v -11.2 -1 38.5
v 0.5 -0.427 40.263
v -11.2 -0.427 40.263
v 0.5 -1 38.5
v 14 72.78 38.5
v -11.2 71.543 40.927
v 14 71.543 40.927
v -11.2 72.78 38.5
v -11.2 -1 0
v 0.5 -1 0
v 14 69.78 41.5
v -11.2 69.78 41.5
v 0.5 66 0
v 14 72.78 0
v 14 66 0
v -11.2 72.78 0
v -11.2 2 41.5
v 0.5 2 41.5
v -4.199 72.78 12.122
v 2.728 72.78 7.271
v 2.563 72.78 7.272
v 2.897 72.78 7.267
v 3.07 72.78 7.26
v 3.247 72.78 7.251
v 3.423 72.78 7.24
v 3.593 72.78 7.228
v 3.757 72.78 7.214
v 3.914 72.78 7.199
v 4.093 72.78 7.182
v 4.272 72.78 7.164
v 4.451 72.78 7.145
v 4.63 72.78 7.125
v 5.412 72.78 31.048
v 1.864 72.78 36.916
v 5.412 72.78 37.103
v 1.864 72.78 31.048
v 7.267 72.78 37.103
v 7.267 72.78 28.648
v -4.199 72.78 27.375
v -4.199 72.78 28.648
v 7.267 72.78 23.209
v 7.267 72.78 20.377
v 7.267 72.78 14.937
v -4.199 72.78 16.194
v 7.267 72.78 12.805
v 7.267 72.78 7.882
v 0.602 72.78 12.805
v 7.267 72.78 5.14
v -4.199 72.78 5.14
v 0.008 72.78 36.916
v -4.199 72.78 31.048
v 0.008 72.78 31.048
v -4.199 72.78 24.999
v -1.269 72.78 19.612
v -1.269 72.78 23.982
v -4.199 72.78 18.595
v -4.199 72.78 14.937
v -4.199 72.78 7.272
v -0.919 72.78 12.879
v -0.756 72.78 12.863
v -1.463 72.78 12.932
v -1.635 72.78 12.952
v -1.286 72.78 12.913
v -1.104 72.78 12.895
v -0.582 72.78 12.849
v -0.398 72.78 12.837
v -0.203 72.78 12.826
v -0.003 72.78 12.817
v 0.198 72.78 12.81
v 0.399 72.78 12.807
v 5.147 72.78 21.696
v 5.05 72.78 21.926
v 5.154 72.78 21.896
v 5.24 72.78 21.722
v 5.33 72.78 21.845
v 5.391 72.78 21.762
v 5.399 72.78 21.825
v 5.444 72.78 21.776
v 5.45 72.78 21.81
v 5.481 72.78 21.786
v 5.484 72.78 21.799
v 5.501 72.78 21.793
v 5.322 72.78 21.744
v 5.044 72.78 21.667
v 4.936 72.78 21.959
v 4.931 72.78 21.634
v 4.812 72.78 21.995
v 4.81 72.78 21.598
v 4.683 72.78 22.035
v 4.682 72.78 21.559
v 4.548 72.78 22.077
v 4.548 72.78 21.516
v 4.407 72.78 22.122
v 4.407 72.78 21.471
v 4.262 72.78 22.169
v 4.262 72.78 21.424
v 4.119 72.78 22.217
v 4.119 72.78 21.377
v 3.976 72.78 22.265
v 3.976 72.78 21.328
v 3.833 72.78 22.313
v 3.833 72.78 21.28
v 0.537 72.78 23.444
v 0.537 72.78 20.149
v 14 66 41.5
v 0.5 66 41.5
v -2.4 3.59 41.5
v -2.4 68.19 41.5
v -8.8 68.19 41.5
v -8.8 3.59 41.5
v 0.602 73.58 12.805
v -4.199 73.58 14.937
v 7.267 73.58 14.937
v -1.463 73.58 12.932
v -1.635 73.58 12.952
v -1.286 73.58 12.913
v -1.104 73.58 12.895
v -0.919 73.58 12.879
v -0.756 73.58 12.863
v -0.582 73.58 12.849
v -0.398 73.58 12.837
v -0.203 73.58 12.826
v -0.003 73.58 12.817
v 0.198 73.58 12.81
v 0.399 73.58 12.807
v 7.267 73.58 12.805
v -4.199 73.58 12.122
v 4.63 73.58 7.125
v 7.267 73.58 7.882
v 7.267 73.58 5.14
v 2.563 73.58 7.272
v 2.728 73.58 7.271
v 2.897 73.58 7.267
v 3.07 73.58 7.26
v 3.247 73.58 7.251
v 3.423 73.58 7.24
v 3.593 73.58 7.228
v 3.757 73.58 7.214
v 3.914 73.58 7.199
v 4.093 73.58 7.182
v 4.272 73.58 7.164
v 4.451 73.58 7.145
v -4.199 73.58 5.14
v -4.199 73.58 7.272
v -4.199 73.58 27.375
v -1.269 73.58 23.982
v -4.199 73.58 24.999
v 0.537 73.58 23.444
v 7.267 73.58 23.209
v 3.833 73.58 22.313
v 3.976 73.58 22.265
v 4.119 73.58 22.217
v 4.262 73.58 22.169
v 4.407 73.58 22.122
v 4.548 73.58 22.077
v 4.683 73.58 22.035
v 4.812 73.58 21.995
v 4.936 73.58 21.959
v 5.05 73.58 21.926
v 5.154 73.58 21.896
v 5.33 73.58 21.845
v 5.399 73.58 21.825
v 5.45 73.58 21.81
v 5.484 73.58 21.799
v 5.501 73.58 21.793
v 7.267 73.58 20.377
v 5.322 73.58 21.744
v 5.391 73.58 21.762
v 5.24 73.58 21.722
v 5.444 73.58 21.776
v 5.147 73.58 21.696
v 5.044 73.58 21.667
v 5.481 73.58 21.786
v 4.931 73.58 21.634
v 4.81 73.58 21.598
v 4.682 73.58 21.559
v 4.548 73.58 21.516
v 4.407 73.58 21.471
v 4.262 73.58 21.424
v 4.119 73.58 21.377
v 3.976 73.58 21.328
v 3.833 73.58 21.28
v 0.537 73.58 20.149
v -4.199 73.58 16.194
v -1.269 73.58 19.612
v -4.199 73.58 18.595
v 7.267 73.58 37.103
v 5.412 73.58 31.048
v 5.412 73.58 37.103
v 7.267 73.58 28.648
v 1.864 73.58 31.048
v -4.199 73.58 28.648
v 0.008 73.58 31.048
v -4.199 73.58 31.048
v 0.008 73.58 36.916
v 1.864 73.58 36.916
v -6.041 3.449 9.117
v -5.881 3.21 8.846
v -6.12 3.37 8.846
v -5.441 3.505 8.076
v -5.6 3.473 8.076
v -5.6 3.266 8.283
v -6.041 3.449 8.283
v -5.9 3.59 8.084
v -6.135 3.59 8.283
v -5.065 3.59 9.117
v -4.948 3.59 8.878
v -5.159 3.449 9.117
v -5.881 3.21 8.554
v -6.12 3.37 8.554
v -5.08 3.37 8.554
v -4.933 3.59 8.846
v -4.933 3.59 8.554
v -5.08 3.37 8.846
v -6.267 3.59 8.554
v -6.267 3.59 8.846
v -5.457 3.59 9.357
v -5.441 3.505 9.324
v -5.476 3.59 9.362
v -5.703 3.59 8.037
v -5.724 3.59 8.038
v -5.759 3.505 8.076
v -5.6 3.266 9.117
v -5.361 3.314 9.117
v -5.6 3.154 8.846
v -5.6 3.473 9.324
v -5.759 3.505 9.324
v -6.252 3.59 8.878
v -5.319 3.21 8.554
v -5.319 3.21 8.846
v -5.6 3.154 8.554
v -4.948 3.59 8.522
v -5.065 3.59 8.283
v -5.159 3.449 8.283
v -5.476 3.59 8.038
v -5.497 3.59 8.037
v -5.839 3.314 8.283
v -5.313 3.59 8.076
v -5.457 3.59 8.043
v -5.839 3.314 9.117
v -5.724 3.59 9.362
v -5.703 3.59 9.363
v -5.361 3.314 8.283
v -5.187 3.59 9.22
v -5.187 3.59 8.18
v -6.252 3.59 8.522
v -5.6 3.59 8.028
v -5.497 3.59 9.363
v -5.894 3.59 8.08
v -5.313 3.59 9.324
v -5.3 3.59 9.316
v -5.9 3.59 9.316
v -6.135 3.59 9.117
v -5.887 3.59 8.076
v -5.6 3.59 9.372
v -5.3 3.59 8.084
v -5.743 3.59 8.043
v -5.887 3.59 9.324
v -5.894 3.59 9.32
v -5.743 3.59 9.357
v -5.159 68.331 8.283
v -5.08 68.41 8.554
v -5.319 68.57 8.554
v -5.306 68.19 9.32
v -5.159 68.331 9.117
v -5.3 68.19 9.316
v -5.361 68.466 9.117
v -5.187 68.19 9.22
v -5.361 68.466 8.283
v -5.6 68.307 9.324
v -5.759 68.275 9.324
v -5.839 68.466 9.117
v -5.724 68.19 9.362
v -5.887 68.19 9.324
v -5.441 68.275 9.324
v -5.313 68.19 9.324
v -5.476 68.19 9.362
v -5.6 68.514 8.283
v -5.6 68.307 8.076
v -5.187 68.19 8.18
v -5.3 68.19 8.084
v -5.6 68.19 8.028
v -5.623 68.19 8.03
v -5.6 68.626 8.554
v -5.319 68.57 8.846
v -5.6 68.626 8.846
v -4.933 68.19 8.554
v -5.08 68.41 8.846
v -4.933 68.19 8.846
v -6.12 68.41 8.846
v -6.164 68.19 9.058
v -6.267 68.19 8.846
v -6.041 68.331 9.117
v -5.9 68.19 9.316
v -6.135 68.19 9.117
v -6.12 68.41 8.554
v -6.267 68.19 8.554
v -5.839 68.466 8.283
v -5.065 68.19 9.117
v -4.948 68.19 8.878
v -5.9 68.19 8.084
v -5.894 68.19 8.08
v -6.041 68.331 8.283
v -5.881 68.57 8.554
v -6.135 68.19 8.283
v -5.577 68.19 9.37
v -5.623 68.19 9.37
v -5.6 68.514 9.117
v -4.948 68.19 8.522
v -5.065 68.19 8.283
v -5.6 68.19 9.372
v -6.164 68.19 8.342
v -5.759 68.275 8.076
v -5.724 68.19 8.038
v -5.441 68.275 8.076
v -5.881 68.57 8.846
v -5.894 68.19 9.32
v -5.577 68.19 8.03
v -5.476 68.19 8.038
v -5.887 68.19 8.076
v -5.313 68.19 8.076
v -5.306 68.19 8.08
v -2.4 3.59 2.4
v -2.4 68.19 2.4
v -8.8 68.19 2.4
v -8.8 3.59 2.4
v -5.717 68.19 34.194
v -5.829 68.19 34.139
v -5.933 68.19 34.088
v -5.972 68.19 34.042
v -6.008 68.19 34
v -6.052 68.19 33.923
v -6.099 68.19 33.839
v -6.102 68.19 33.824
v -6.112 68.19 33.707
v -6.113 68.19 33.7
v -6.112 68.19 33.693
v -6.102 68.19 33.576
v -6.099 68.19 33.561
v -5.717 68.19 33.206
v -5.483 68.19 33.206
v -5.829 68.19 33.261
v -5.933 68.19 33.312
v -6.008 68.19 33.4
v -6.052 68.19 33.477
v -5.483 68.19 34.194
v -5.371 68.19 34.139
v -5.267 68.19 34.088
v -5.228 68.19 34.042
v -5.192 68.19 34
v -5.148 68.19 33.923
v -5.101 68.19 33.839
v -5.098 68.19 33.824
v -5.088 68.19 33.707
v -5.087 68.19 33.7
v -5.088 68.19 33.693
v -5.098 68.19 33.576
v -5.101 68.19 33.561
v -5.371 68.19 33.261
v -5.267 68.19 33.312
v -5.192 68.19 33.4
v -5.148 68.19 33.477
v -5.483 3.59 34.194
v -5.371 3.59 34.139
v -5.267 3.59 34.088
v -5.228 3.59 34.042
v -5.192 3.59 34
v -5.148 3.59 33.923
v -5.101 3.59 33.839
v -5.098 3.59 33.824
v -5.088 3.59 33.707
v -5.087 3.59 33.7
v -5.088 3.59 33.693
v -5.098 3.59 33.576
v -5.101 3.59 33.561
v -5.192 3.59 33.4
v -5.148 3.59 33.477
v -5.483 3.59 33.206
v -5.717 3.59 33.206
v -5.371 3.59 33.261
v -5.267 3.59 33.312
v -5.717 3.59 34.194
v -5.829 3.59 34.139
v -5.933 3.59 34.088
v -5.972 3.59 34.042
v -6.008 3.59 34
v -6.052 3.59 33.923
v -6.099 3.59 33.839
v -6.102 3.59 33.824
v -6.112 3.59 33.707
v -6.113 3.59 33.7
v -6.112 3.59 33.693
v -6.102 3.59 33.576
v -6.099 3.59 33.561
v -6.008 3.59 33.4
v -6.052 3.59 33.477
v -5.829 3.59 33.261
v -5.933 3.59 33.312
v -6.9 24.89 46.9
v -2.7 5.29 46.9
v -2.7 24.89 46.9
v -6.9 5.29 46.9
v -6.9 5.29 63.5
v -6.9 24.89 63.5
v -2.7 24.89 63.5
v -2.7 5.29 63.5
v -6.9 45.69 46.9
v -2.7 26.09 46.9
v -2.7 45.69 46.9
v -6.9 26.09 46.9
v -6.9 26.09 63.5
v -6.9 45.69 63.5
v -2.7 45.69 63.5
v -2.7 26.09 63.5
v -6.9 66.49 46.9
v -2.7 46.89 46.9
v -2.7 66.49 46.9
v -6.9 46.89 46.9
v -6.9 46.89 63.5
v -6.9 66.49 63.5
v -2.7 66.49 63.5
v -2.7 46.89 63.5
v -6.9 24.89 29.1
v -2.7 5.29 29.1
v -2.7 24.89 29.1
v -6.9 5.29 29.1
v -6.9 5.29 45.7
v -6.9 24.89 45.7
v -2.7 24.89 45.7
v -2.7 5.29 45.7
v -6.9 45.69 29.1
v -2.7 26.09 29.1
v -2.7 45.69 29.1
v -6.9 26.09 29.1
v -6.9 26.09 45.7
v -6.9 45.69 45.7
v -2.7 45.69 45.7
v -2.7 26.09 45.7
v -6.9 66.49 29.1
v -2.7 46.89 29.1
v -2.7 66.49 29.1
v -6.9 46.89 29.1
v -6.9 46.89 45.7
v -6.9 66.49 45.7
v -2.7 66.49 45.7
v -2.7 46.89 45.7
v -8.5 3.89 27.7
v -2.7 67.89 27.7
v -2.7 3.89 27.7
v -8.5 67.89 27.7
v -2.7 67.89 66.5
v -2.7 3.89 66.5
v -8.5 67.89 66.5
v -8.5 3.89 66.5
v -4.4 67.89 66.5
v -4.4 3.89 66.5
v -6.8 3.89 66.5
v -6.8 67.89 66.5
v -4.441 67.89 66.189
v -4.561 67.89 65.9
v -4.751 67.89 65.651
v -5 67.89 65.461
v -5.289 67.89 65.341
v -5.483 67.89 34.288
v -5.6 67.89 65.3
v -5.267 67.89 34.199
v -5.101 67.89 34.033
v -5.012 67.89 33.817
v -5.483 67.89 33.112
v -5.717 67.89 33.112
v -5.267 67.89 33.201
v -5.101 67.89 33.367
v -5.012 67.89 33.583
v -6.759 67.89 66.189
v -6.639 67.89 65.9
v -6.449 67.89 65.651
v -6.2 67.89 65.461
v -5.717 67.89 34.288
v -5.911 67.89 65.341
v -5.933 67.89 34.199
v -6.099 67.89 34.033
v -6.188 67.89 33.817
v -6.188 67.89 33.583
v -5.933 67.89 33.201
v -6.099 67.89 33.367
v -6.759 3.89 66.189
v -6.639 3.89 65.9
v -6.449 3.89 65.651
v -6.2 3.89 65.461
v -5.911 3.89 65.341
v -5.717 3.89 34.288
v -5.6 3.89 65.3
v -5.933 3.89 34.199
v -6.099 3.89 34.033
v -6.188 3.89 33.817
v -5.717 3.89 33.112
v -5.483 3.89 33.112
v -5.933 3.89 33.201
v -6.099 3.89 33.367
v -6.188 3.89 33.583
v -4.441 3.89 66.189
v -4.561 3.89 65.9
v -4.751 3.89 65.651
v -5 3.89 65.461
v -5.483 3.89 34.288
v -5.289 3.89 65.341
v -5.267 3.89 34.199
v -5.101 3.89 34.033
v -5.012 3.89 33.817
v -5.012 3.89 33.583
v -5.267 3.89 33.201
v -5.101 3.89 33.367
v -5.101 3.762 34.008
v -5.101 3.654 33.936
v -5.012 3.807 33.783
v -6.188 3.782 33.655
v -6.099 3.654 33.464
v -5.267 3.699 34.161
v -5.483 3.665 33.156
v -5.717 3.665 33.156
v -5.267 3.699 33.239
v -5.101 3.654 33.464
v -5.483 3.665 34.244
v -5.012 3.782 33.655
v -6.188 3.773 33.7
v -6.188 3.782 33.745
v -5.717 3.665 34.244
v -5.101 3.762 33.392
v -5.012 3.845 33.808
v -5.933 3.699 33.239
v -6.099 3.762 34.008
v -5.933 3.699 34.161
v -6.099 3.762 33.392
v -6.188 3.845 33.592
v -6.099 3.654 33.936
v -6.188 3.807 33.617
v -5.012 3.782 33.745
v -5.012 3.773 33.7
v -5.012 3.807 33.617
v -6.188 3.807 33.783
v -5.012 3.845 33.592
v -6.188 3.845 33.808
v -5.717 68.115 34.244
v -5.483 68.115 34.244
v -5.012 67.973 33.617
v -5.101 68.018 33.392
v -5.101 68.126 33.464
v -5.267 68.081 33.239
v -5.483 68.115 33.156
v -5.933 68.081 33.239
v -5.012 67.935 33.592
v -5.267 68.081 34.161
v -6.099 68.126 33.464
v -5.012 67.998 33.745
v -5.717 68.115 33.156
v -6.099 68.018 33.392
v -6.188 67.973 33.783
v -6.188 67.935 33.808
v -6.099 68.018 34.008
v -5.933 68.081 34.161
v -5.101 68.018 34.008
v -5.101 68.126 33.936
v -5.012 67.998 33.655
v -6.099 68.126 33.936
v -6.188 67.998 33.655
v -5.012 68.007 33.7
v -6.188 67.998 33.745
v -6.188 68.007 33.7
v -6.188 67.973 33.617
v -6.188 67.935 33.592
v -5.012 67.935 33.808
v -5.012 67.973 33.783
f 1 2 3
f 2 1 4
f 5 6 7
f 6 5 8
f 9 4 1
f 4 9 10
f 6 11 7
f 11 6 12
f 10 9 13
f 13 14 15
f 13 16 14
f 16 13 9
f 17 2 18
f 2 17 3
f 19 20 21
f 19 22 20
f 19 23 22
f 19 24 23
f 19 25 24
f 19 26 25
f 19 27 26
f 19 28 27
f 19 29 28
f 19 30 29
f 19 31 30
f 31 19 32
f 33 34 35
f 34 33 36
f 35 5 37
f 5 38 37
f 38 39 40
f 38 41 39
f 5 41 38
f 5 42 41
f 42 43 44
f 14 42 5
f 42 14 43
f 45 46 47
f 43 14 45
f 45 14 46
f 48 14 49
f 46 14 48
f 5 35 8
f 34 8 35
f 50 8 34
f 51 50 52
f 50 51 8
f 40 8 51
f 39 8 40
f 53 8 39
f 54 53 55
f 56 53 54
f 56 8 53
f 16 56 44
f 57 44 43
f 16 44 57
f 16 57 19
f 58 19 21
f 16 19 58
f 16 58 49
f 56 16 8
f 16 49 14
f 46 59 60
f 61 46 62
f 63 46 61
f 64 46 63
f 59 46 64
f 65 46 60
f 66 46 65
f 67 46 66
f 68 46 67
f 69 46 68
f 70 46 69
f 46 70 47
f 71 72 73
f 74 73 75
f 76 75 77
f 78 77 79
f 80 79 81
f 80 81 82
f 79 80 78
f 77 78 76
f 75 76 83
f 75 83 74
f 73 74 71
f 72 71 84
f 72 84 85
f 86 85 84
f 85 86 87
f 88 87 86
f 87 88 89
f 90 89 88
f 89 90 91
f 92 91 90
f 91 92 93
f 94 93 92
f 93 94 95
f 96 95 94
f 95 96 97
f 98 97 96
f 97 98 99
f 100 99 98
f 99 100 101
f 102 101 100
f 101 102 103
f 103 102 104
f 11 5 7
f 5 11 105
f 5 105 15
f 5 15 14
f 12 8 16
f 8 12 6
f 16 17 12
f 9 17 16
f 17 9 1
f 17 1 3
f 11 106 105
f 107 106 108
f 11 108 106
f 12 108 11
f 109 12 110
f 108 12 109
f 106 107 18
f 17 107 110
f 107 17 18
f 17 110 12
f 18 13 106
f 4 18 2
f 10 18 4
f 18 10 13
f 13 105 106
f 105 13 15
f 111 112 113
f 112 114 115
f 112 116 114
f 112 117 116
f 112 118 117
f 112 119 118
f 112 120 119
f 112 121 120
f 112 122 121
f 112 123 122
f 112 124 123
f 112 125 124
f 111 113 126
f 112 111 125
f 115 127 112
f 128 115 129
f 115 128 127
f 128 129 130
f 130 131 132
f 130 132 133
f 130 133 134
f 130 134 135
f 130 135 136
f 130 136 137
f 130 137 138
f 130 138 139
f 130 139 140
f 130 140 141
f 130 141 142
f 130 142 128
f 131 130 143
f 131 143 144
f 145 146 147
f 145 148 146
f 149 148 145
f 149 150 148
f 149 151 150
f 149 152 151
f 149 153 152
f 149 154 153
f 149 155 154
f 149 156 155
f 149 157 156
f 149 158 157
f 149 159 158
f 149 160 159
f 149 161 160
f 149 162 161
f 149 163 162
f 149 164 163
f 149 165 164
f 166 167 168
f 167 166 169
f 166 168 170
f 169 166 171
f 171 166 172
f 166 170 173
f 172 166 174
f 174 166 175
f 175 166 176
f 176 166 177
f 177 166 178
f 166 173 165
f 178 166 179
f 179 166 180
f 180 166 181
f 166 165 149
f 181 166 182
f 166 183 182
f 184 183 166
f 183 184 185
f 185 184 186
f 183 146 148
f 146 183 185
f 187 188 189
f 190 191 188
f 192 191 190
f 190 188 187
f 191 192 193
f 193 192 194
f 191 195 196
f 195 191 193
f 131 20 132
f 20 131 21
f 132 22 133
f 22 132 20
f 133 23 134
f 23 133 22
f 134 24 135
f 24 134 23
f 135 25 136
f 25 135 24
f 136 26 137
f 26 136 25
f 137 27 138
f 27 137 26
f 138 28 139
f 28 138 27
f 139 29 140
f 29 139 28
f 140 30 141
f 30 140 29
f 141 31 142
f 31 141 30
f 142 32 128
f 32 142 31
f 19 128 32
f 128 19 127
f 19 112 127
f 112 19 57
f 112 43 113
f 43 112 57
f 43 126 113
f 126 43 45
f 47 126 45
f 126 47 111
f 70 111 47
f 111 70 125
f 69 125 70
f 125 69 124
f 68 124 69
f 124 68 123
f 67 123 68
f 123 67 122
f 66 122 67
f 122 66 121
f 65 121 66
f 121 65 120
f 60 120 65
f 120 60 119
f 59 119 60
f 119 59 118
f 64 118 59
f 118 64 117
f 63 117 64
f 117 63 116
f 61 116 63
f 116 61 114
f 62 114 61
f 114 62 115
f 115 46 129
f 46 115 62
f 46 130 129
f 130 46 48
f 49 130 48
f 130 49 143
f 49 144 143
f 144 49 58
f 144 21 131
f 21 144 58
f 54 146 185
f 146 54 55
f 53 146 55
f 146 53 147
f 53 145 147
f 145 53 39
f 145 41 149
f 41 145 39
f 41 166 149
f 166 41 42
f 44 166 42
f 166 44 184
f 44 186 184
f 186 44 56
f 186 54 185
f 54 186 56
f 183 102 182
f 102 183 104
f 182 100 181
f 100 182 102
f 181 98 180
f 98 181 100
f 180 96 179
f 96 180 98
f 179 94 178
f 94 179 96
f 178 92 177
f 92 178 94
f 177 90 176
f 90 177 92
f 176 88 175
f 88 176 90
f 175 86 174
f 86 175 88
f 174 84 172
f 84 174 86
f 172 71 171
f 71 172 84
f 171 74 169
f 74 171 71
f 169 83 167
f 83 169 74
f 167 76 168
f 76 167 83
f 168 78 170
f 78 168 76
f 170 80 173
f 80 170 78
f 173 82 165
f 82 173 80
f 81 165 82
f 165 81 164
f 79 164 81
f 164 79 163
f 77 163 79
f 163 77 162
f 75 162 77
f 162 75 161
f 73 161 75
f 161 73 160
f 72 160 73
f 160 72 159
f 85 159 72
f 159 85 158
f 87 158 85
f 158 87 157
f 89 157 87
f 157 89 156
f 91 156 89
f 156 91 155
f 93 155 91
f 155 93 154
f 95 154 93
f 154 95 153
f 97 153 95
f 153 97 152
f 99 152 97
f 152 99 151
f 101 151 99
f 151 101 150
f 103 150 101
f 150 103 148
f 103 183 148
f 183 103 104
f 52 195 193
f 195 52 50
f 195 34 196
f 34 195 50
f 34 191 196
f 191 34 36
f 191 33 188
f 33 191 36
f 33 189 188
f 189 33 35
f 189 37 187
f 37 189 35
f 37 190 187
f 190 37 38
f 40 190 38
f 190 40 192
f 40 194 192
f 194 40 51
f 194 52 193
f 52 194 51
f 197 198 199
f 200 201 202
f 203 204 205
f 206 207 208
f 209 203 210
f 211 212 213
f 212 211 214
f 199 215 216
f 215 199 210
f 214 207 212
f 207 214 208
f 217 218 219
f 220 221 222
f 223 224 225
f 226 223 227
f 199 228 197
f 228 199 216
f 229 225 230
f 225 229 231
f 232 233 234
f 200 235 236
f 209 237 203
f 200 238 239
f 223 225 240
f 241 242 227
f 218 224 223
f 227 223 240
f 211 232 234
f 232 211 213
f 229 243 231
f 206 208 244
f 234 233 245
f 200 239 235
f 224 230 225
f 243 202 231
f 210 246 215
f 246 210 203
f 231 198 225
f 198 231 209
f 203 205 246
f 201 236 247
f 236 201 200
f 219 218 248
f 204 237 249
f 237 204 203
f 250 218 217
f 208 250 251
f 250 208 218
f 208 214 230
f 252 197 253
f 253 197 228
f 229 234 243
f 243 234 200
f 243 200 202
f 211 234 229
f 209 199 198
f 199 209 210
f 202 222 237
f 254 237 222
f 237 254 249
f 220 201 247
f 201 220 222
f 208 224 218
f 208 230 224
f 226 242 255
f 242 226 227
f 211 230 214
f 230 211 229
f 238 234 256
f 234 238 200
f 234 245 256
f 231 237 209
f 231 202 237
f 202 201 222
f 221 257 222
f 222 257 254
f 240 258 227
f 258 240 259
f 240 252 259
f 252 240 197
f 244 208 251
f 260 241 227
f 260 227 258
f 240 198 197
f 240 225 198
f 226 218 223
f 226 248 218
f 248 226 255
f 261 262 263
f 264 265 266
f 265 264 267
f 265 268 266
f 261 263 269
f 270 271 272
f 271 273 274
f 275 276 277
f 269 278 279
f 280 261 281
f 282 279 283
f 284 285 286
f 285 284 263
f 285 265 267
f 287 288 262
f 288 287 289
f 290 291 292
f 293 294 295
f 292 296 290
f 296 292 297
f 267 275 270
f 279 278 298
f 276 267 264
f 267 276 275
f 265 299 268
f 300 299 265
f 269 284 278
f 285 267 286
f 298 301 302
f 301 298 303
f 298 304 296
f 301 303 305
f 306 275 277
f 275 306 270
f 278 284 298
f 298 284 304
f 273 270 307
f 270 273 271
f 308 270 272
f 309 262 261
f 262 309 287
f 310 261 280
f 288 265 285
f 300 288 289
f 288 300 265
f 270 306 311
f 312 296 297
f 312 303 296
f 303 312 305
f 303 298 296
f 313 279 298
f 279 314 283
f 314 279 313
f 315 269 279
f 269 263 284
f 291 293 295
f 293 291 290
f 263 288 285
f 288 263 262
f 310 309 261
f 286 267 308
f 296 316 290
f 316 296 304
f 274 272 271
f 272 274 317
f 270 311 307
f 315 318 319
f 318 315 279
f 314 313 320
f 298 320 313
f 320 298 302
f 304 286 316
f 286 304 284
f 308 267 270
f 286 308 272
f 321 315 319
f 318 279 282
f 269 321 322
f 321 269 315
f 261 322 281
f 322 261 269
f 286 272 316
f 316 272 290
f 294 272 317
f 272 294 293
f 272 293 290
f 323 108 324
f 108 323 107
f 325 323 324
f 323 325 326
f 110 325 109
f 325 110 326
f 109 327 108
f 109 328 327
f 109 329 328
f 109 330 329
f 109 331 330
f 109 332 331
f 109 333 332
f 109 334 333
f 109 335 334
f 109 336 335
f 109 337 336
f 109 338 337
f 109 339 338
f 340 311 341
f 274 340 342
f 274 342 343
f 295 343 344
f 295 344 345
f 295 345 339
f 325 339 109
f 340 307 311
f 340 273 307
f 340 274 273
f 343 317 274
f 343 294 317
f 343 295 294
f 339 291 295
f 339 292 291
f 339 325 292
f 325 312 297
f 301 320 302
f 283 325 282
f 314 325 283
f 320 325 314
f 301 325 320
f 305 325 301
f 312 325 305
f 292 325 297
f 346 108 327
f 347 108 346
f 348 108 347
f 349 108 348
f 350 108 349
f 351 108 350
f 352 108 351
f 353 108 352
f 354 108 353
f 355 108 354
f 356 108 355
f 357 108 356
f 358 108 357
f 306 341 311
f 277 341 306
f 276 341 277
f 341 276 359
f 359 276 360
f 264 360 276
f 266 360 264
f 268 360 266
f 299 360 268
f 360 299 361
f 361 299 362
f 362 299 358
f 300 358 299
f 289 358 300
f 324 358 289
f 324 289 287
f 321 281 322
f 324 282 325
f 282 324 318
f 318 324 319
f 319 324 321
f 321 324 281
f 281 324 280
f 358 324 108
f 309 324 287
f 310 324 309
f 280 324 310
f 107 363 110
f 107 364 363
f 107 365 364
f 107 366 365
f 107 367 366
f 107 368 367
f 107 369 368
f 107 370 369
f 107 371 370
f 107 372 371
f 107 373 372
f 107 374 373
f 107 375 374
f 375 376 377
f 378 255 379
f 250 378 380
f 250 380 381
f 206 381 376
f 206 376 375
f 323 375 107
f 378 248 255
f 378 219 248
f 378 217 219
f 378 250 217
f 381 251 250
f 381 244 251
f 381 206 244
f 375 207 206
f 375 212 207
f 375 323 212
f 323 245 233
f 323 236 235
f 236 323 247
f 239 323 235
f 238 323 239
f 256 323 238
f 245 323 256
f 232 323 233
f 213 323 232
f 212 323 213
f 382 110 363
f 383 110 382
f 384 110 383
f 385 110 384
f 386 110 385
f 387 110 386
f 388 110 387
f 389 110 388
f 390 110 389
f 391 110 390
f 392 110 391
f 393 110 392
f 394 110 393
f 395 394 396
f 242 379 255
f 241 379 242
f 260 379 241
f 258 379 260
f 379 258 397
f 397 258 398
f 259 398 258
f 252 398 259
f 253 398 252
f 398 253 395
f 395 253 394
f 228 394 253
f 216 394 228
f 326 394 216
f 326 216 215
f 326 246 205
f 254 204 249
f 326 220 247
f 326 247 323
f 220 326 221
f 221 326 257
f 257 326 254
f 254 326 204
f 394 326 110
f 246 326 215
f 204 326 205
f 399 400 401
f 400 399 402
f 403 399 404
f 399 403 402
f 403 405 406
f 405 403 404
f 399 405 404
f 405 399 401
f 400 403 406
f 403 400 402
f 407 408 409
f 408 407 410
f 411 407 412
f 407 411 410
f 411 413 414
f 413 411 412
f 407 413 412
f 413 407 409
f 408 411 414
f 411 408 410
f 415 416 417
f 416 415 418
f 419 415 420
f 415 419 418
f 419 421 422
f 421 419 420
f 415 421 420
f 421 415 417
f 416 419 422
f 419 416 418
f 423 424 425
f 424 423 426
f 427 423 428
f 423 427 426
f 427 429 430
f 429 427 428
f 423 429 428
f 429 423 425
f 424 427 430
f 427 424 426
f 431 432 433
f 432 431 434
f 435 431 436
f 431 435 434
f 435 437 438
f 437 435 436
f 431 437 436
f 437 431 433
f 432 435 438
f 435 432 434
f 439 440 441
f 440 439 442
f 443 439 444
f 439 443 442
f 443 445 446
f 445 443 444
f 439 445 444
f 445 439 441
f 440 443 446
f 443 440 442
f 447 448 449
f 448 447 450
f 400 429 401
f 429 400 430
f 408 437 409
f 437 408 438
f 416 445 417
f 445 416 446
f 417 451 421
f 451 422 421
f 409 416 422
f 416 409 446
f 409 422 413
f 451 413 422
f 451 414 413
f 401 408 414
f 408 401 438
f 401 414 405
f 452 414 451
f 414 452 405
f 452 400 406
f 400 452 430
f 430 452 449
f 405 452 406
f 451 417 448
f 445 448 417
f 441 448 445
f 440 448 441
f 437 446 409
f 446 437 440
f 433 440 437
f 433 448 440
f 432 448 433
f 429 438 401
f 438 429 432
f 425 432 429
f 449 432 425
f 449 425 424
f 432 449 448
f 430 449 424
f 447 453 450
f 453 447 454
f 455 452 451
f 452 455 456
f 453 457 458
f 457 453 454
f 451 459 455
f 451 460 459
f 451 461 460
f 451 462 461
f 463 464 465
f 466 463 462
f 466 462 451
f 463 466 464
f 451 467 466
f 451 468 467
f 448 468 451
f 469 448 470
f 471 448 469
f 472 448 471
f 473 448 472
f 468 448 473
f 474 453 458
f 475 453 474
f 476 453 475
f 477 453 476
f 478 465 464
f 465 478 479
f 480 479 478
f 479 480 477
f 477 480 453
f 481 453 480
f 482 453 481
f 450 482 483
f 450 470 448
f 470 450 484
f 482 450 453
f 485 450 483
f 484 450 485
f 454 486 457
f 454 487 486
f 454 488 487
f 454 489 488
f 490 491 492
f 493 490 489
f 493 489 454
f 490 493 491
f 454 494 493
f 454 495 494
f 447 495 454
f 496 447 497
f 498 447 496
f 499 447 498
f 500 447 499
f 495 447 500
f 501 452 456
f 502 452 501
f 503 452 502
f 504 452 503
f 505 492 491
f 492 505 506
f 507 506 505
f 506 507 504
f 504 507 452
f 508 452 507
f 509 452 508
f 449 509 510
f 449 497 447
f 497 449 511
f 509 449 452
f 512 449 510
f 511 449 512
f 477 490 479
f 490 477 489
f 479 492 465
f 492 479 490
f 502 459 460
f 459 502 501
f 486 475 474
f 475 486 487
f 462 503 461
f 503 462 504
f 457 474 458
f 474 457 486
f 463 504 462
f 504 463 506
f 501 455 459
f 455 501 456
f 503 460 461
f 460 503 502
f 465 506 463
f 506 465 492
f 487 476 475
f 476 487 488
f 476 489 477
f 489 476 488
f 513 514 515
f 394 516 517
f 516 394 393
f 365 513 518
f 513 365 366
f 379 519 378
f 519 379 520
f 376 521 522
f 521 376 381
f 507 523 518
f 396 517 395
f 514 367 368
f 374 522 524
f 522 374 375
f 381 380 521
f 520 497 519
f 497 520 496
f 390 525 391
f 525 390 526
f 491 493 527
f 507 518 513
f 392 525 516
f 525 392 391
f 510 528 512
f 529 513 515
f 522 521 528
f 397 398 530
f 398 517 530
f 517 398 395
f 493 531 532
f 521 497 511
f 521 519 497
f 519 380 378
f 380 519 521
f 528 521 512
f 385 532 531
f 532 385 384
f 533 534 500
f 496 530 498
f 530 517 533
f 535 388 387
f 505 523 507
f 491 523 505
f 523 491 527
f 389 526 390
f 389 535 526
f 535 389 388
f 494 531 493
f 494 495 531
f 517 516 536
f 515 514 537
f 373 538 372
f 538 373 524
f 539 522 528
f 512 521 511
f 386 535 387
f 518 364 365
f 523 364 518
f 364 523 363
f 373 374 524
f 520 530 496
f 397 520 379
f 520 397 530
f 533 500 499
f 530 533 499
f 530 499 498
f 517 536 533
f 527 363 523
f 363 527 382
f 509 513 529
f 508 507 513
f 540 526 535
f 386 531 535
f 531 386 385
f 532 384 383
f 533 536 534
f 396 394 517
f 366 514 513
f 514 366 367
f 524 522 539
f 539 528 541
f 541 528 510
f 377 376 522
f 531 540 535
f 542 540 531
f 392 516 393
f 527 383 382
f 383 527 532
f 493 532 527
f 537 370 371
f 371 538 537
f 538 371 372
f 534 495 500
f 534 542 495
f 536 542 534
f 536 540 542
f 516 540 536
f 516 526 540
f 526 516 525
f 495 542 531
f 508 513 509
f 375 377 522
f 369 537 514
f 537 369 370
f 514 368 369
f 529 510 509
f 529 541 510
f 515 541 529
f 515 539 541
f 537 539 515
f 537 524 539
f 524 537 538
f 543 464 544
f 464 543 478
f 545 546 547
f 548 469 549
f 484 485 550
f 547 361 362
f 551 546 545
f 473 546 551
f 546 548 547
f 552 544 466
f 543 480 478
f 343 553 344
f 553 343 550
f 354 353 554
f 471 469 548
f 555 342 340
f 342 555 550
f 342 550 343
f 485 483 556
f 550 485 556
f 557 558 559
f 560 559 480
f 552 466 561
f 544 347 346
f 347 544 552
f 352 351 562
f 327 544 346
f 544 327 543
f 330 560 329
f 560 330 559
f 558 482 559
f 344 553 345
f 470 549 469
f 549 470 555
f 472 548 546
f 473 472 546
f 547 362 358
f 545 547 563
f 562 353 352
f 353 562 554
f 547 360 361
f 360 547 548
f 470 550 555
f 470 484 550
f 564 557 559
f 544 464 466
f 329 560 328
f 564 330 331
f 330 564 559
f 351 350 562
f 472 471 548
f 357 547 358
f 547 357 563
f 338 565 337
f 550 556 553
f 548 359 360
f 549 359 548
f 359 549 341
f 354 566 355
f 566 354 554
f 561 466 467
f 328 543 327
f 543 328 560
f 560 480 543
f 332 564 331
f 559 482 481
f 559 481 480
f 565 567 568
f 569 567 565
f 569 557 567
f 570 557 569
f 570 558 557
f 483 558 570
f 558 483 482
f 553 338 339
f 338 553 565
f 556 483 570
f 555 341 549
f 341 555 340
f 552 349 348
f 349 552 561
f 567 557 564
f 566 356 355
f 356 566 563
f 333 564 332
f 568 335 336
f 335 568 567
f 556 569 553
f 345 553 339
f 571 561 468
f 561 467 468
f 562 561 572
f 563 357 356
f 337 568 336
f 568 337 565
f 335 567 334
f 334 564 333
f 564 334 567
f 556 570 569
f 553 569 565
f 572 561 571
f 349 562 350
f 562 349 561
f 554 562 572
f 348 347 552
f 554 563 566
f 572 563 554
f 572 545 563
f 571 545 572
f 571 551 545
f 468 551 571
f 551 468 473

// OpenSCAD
// Pebble Time 2 charging dock v2: weighted false-bottom drawer.
// Units mm. Frame = PRINT frame (original dock base-down, +Z up).
//
// In USE the dock stands on the back wall's outer face (print -X face), so the
// weight plate is added on -X. The body = plate() unioned (Python/manifold,
// build.py) with the original pebblechargingdock_v7 mesh, so the loop, facet,
// charger slot and watch-back recess are preserved exactly. Tray prints separately.
//
// Tray slides in along print +Z (open end at the top of the plate in print
// orientation = a side face in use). 6 weights: 2 along the slide axis x 3 across.

// ---- weights -------------------------------------------------------------
weight_a = 16;      // along the slide axis
weight_b = 19;      // across
weight_h = 4;       // thickness
w_clear  = 0.3;     // per-side drop-in clearance in the pockets

// ---- tray (local frame: X = slide axis, pull face at X=0; Y across; Z thickness)
tray_floor  = 1.6;
wall_outer  = 1.4;
wall_front  = 3.0;     // pull face wall, carries the fingernail groove
wall_inner  = 1.2;
pa = weight_a + 2*w_clear; pb = weight_b + 2*w_clear;
tray_x = 2*pa + wall_front + wall_outer + wall_inner;   // along slide axis
tray_y = 3*pb + 2*wall_outer + 2*wall_inner;            // across
tray_h = tray_floor + weight_h + 0.2;
slide_clear = 0.3;
detent_r = 0.6;

// ---- plate on the -X face --------------------------------------------------
orig_y = 67.78;                 // original wall spans y 0..67.78, z 0..40
skin   = 2.4;                   // material each side of the slot (X) and under it (Z)
plate_t  = tray_h + 2*slide_clear + 2*skin;      // X thickness of the plate
plate_y0 = -1;  plate_y1 = orig_y + 5;             // +Y end extended 4 mm for the front panel
slot_y   = tray_y + 2*slide_clear;
slot_y0  = (plate_y0 + plate_y1)/2 - slot_y/2;
slot_z0  = skin;
plate_z1 = slot_z0 + tray_x + slide_clear;       // slot is open at the top (print +Z)
plate_r  = 3;
overlap  = 0.5;                                  // bury the plate into the wall face
detent_x_local = tray_x - 6;                     // bumps near the inner end

// ---- front panel + personalization ----------------------------------------
// The front in use is the print +Y end (the watch screen faces +X+Y). The plate's
// end face continues upward (print +X) as a flat panel that carries the lettering.
panel_h   = 14;                 // how far the panel rises above the wall foot (print +X)
panel_y0  = 66;                 // panel starts here so it clears the band path (loop ends ~y 61)
personalization = "NAF";        // "" for none
text_size  = 12;
text_depth = 0.8;               // raised height (emboss) or cut depth (engrave)
text_style = "emboss";          // "emboss" | "engrave"
text_font  = "Liberation Sans:style=Bold";

module tray() {
    difference() {
        cube([tray_x, tray_y, tray_h]);
        for (i = [0:1], j = [0:2])
            translate([wall_front + i*(pa + wall_inner), wall_outer + j*(pb + wall_inner), tray_floor])
                cube([pa, pb, tray_h]);
        // fingernail groove across the pull face
        translate([0, -1, tray_h/2]) rotate([-90, 0, 0]) cylinder(r = 1.2, h = tray_y + 2, $fn = 24);
    }
    for (y = [0, tray_y])
        translate([detent_x_local, y, tray_h/2]) sphere(r = detent_r, $fn = 16);
}

// place the tray in the plate: local X -> print -Z (pull face up), Z -> print +X
module tray_in_plate(pull = 0) {
    translate([-plate_t + skin + slide_clear, slot_y0 + slide_clear, plate_z1 + pull])
        rotate([0, 90, 0]) tray();
}

module tray_slot() {
    sx = tray_h + 2*slide_clear;
    translate([-plate_t + skin, slot_y0, slot_z0]) cube([sx, slot_y, 100]);
    // detent dimples, exactly where the bumps land when the tray is home
    for (y = [slot_y0 + slide_clear, slot_y0 + slide_clear + tray_y])
        translate([-plate_t + skin + slide_clear + tray_h/2, y, plate_z1 - detent_x_local])
            sphere(r = detent_r + 0.15, $fn = 16);
}

module plate_profile() {   // 2D, drawn as (z, y): rounded top corners, flat print-bed edge at z = 0
    intersection() {
        offset(plate_r) offset(-plate_r) translate([-plate_r - 1, plate_y0]) square([plate_z1 + plate_r + 1, plate_y1 - plate_y0]);
        translate([0, plate_y0 - 1]) square([plate_z1 + 1, plate_y1 - plate_y0 + 2]);
    }
}

// lettering on the front face (y = plate_y1): text x -> print +Z, text y -> print +X
module lettering(h) {
    cx = (-plate_t + panel_h)/2;  cz = plate_z1/2;
    translate([cx, plate_y1, cz]) rotate([0, 0, -90]) rotate([0, -90, 0])
        linear_extrude(h) text(personalization, size = text_size, font = text_font, halign = "center", valign = "center");
}

module plate() {
    difference() {
        union() {
            // plate (x -plate_t..overlap) and panel (x 0..panel_h, y >= panel_y0) share one profile
            // rotate([0,-90,0]) maps 2D x -> Z, 2D y -> Y, extrude -> -X
            difference() {
                translate([panel_h, 0, 0]) rotate([0, -90, 0]) linear_extrude(plate_t + panel_h) plate_profile();
                translate([overlap, plate_y0 - 1, -1]) cube([panel_h + 1, panel_y0 - plate_y0 + 1, plate_z1 + 2]);
            }
            if (personalization != "" && text_style == "emboss") translate([0, -0.01, 0]) lettering(text_depth + 0.01);
        }
        tray_slot();
        if (personalization != "" && text_style == "engrave") translate([0, -text_depth, 0]) lettering(text_depth + 1);
    }
}

part = "both";   // "tray" | "plate" | "both"
if (part == "tray") tray();
else if (part == "plate") plate();
else { plate(); tray_in_plate(pull = 25); }
echo(personalization = personalization, tray_x = tray_x, tray_y = tray_y, tray_h = tray_h, plate_t = plate_t, plate_z1 = plate_z1, slot_y0 = slot_y0);
